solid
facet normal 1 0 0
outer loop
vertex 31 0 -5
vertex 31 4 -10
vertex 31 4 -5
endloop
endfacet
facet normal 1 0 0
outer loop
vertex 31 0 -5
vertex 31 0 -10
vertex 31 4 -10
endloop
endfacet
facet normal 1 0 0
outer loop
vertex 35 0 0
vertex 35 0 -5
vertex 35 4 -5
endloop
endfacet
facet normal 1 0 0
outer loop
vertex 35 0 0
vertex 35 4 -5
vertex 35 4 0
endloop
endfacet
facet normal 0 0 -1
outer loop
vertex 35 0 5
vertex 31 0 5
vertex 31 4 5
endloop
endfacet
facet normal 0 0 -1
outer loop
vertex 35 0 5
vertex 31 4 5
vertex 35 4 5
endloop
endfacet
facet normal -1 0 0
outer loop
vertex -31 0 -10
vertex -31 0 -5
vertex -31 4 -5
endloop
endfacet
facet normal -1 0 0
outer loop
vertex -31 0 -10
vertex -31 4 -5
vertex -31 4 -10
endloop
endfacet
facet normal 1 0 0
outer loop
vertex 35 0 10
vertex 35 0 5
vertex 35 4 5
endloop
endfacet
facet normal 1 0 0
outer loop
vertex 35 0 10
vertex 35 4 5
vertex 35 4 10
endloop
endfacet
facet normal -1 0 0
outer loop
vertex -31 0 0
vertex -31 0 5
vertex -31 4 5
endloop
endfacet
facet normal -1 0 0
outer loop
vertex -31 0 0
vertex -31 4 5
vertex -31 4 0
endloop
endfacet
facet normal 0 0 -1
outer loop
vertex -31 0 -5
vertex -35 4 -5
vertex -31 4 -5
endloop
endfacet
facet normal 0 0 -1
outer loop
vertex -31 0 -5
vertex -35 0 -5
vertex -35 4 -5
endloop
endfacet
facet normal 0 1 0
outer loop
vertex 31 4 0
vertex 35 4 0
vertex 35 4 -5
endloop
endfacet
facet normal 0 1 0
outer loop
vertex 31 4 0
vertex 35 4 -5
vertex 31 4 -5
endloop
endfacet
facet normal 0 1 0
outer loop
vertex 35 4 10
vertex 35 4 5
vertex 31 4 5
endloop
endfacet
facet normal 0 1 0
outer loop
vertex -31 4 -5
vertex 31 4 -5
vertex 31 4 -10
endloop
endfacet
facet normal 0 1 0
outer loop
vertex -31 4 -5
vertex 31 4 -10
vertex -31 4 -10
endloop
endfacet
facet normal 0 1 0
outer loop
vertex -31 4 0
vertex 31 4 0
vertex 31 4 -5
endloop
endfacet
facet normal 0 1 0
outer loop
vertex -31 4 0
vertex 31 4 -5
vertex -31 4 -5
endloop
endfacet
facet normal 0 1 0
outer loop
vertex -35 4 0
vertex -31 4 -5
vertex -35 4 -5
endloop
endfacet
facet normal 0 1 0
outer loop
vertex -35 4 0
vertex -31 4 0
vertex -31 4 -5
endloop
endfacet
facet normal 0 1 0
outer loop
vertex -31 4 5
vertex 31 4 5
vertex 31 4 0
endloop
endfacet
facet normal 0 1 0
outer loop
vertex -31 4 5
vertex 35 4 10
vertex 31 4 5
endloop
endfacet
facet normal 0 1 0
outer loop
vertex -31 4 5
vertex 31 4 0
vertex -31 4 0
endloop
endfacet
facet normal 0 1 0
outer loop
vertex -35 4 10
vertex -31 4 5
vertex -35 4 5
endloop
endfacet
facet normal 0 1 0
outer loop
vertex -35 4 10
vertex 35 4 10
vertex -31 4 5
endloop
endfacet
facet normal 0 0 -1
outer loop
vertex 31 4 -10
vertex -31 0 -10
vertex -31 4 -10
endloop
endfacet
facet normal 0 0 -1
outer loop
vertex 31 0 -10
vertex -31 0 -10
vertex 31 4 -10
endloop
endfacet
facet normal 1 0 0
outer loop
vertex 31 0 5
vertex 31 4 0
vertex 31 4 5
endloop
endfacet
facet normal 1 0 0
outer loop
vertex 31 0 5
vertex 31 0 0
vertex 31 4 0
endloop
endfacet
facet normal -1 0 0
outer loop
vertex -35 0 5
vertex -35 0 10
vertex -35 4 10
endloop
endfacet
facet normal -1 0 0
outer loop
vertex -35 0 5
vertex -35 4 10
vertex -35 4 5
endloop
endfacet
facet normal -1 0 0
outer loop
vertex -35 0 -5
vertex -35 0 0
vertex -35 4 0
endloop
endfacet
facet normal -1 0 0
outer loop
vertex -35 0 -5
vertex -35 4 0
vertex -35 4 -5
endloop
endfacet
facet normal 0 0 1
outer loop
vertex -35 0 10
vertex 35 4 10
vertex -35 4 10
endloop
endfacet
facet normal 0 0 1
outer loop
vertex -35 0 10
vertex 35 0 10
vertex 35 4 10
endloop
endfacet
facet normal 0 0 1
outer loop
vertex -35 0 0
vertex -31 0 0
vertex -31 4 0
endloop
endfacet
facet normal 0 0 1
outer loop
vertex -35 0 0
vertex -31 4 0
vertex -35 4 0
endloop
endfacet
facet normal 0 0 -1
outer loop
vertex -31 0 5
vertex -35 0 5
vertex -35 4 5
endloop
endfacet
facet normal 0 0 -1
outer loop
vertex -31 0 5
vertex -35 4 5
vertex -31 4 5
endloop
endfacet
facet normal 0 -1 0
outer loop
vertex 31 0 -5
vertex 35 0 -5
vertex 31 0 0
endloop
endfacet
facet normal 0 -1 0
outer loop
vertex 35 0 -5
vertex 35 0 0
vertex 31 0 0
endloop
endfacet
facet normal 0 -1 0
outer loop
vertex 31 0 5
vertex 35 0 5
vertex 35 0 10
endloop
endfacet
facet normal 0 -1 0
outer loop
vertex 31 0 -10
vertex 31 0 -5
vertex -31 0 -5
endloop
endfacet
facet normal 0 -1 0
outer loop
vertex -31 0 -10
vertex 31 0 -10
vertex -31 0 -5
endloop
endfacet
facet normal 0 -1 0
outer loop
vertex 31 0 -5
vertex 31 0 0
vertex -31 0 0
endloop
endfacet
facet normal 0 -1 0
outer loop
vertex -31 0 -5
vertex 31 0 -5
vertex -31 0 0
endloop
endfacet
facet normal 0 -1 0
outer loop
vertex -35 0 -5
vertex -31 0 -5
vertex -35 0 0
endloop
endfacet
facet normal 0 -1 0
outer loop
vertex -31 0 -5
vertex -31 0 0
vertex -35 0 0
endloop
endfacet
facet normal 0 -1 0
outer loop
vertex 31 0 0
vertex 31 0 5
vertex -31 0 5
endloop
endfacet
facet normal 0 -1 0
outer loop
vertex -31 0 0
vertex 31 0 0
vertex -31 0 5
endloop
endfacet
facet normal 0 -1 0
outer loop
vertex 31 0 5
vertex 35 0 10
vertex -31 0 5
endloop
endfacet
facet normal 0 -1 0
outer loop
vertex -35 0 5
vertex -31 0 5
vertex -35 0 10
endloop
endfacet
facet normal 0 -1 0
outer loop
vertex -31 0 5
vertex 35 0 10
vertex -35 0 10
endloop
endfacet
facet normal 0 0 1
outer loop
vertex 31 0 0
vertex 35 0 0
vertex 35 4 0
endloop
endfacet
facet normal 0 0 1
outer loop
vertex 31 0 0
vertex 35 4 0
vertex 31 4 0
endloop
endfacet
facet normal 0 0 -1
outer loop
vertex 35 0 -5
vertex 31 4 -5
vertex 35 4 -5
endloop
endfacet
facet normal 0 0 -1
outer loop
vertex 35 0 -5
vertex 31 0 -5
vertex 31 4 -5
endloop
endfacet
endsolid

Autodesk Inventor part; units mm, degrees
ref_plane "YZ Plane" through (0, 0, 0) normal (1, 0, 0) x (0, 1, 0)
ref_plane "XZ Plane" through (0, 0, 0) normal (0, 1, 0) x (-1, 0, 0)
ref_plane "XY Plane" through (0, 0, 0) normal (0, 0, 1) x (1, 0, 0)
sketch "Schizzo1" plane through (0, 0, 0) normal (0, 1, 0) x (-1, 0, 0)
  line L0 (-35, 10) -> (35, 10)
  line L1 (35, 10) -> (35, -10)
  line L2 (35, -10) -> (-35, -10)
  line L3 (-35, -10) -> (-35, 10)
  line L4 (-35, 10) -> (35, -10) construction
  line L5 (35, 10) -> (-35, -10) construction
  point P0 (0, 0)
  dimension "d0" = 70
  dimension "d1" = 20
extrude "Estrusione1" add sketch "Schizzo1" along normal blind 4
sketch "Schizzo2" plane through (0, 0, 0) normal (0, -1, 0) x (1, 0, 0)
  line L0 (-31, 0) -> (-35, 0)
  line L1 (-35, 0) -> (-35, 5)
  line L2 (-35, 5) -> (-31, 5)
  line L3 (-31, 5) -> (-31, 0)
  line L4 (-35, -5) -> (-31, -5)
  line L5 (-31, -5) -> (-31, -10)
  line L6 (-31, -10) -> (-35, -10)
  line L7 (-35, -10) -> (-35, -5)
  line L8 (35, 0) -> (31, 0)
  line L9 (31, 0) -> (31, 5)
  line L10 (31, 5) -> (35, 5)
  line L11 (35, 5) -> (35, 0)
  line L12 (31, -5) -> (35, -5)
  line L13 (35, -5) -> (35, -10)
  line L14 (35, -10) -> (31, -10)
  line L15 (31, -10) -> (31, -5)
  point P0 (0, 0)
extrude "Estrusione2" cut sketch "Schizzo2" against normal blind 10
properties part number "sotto"
